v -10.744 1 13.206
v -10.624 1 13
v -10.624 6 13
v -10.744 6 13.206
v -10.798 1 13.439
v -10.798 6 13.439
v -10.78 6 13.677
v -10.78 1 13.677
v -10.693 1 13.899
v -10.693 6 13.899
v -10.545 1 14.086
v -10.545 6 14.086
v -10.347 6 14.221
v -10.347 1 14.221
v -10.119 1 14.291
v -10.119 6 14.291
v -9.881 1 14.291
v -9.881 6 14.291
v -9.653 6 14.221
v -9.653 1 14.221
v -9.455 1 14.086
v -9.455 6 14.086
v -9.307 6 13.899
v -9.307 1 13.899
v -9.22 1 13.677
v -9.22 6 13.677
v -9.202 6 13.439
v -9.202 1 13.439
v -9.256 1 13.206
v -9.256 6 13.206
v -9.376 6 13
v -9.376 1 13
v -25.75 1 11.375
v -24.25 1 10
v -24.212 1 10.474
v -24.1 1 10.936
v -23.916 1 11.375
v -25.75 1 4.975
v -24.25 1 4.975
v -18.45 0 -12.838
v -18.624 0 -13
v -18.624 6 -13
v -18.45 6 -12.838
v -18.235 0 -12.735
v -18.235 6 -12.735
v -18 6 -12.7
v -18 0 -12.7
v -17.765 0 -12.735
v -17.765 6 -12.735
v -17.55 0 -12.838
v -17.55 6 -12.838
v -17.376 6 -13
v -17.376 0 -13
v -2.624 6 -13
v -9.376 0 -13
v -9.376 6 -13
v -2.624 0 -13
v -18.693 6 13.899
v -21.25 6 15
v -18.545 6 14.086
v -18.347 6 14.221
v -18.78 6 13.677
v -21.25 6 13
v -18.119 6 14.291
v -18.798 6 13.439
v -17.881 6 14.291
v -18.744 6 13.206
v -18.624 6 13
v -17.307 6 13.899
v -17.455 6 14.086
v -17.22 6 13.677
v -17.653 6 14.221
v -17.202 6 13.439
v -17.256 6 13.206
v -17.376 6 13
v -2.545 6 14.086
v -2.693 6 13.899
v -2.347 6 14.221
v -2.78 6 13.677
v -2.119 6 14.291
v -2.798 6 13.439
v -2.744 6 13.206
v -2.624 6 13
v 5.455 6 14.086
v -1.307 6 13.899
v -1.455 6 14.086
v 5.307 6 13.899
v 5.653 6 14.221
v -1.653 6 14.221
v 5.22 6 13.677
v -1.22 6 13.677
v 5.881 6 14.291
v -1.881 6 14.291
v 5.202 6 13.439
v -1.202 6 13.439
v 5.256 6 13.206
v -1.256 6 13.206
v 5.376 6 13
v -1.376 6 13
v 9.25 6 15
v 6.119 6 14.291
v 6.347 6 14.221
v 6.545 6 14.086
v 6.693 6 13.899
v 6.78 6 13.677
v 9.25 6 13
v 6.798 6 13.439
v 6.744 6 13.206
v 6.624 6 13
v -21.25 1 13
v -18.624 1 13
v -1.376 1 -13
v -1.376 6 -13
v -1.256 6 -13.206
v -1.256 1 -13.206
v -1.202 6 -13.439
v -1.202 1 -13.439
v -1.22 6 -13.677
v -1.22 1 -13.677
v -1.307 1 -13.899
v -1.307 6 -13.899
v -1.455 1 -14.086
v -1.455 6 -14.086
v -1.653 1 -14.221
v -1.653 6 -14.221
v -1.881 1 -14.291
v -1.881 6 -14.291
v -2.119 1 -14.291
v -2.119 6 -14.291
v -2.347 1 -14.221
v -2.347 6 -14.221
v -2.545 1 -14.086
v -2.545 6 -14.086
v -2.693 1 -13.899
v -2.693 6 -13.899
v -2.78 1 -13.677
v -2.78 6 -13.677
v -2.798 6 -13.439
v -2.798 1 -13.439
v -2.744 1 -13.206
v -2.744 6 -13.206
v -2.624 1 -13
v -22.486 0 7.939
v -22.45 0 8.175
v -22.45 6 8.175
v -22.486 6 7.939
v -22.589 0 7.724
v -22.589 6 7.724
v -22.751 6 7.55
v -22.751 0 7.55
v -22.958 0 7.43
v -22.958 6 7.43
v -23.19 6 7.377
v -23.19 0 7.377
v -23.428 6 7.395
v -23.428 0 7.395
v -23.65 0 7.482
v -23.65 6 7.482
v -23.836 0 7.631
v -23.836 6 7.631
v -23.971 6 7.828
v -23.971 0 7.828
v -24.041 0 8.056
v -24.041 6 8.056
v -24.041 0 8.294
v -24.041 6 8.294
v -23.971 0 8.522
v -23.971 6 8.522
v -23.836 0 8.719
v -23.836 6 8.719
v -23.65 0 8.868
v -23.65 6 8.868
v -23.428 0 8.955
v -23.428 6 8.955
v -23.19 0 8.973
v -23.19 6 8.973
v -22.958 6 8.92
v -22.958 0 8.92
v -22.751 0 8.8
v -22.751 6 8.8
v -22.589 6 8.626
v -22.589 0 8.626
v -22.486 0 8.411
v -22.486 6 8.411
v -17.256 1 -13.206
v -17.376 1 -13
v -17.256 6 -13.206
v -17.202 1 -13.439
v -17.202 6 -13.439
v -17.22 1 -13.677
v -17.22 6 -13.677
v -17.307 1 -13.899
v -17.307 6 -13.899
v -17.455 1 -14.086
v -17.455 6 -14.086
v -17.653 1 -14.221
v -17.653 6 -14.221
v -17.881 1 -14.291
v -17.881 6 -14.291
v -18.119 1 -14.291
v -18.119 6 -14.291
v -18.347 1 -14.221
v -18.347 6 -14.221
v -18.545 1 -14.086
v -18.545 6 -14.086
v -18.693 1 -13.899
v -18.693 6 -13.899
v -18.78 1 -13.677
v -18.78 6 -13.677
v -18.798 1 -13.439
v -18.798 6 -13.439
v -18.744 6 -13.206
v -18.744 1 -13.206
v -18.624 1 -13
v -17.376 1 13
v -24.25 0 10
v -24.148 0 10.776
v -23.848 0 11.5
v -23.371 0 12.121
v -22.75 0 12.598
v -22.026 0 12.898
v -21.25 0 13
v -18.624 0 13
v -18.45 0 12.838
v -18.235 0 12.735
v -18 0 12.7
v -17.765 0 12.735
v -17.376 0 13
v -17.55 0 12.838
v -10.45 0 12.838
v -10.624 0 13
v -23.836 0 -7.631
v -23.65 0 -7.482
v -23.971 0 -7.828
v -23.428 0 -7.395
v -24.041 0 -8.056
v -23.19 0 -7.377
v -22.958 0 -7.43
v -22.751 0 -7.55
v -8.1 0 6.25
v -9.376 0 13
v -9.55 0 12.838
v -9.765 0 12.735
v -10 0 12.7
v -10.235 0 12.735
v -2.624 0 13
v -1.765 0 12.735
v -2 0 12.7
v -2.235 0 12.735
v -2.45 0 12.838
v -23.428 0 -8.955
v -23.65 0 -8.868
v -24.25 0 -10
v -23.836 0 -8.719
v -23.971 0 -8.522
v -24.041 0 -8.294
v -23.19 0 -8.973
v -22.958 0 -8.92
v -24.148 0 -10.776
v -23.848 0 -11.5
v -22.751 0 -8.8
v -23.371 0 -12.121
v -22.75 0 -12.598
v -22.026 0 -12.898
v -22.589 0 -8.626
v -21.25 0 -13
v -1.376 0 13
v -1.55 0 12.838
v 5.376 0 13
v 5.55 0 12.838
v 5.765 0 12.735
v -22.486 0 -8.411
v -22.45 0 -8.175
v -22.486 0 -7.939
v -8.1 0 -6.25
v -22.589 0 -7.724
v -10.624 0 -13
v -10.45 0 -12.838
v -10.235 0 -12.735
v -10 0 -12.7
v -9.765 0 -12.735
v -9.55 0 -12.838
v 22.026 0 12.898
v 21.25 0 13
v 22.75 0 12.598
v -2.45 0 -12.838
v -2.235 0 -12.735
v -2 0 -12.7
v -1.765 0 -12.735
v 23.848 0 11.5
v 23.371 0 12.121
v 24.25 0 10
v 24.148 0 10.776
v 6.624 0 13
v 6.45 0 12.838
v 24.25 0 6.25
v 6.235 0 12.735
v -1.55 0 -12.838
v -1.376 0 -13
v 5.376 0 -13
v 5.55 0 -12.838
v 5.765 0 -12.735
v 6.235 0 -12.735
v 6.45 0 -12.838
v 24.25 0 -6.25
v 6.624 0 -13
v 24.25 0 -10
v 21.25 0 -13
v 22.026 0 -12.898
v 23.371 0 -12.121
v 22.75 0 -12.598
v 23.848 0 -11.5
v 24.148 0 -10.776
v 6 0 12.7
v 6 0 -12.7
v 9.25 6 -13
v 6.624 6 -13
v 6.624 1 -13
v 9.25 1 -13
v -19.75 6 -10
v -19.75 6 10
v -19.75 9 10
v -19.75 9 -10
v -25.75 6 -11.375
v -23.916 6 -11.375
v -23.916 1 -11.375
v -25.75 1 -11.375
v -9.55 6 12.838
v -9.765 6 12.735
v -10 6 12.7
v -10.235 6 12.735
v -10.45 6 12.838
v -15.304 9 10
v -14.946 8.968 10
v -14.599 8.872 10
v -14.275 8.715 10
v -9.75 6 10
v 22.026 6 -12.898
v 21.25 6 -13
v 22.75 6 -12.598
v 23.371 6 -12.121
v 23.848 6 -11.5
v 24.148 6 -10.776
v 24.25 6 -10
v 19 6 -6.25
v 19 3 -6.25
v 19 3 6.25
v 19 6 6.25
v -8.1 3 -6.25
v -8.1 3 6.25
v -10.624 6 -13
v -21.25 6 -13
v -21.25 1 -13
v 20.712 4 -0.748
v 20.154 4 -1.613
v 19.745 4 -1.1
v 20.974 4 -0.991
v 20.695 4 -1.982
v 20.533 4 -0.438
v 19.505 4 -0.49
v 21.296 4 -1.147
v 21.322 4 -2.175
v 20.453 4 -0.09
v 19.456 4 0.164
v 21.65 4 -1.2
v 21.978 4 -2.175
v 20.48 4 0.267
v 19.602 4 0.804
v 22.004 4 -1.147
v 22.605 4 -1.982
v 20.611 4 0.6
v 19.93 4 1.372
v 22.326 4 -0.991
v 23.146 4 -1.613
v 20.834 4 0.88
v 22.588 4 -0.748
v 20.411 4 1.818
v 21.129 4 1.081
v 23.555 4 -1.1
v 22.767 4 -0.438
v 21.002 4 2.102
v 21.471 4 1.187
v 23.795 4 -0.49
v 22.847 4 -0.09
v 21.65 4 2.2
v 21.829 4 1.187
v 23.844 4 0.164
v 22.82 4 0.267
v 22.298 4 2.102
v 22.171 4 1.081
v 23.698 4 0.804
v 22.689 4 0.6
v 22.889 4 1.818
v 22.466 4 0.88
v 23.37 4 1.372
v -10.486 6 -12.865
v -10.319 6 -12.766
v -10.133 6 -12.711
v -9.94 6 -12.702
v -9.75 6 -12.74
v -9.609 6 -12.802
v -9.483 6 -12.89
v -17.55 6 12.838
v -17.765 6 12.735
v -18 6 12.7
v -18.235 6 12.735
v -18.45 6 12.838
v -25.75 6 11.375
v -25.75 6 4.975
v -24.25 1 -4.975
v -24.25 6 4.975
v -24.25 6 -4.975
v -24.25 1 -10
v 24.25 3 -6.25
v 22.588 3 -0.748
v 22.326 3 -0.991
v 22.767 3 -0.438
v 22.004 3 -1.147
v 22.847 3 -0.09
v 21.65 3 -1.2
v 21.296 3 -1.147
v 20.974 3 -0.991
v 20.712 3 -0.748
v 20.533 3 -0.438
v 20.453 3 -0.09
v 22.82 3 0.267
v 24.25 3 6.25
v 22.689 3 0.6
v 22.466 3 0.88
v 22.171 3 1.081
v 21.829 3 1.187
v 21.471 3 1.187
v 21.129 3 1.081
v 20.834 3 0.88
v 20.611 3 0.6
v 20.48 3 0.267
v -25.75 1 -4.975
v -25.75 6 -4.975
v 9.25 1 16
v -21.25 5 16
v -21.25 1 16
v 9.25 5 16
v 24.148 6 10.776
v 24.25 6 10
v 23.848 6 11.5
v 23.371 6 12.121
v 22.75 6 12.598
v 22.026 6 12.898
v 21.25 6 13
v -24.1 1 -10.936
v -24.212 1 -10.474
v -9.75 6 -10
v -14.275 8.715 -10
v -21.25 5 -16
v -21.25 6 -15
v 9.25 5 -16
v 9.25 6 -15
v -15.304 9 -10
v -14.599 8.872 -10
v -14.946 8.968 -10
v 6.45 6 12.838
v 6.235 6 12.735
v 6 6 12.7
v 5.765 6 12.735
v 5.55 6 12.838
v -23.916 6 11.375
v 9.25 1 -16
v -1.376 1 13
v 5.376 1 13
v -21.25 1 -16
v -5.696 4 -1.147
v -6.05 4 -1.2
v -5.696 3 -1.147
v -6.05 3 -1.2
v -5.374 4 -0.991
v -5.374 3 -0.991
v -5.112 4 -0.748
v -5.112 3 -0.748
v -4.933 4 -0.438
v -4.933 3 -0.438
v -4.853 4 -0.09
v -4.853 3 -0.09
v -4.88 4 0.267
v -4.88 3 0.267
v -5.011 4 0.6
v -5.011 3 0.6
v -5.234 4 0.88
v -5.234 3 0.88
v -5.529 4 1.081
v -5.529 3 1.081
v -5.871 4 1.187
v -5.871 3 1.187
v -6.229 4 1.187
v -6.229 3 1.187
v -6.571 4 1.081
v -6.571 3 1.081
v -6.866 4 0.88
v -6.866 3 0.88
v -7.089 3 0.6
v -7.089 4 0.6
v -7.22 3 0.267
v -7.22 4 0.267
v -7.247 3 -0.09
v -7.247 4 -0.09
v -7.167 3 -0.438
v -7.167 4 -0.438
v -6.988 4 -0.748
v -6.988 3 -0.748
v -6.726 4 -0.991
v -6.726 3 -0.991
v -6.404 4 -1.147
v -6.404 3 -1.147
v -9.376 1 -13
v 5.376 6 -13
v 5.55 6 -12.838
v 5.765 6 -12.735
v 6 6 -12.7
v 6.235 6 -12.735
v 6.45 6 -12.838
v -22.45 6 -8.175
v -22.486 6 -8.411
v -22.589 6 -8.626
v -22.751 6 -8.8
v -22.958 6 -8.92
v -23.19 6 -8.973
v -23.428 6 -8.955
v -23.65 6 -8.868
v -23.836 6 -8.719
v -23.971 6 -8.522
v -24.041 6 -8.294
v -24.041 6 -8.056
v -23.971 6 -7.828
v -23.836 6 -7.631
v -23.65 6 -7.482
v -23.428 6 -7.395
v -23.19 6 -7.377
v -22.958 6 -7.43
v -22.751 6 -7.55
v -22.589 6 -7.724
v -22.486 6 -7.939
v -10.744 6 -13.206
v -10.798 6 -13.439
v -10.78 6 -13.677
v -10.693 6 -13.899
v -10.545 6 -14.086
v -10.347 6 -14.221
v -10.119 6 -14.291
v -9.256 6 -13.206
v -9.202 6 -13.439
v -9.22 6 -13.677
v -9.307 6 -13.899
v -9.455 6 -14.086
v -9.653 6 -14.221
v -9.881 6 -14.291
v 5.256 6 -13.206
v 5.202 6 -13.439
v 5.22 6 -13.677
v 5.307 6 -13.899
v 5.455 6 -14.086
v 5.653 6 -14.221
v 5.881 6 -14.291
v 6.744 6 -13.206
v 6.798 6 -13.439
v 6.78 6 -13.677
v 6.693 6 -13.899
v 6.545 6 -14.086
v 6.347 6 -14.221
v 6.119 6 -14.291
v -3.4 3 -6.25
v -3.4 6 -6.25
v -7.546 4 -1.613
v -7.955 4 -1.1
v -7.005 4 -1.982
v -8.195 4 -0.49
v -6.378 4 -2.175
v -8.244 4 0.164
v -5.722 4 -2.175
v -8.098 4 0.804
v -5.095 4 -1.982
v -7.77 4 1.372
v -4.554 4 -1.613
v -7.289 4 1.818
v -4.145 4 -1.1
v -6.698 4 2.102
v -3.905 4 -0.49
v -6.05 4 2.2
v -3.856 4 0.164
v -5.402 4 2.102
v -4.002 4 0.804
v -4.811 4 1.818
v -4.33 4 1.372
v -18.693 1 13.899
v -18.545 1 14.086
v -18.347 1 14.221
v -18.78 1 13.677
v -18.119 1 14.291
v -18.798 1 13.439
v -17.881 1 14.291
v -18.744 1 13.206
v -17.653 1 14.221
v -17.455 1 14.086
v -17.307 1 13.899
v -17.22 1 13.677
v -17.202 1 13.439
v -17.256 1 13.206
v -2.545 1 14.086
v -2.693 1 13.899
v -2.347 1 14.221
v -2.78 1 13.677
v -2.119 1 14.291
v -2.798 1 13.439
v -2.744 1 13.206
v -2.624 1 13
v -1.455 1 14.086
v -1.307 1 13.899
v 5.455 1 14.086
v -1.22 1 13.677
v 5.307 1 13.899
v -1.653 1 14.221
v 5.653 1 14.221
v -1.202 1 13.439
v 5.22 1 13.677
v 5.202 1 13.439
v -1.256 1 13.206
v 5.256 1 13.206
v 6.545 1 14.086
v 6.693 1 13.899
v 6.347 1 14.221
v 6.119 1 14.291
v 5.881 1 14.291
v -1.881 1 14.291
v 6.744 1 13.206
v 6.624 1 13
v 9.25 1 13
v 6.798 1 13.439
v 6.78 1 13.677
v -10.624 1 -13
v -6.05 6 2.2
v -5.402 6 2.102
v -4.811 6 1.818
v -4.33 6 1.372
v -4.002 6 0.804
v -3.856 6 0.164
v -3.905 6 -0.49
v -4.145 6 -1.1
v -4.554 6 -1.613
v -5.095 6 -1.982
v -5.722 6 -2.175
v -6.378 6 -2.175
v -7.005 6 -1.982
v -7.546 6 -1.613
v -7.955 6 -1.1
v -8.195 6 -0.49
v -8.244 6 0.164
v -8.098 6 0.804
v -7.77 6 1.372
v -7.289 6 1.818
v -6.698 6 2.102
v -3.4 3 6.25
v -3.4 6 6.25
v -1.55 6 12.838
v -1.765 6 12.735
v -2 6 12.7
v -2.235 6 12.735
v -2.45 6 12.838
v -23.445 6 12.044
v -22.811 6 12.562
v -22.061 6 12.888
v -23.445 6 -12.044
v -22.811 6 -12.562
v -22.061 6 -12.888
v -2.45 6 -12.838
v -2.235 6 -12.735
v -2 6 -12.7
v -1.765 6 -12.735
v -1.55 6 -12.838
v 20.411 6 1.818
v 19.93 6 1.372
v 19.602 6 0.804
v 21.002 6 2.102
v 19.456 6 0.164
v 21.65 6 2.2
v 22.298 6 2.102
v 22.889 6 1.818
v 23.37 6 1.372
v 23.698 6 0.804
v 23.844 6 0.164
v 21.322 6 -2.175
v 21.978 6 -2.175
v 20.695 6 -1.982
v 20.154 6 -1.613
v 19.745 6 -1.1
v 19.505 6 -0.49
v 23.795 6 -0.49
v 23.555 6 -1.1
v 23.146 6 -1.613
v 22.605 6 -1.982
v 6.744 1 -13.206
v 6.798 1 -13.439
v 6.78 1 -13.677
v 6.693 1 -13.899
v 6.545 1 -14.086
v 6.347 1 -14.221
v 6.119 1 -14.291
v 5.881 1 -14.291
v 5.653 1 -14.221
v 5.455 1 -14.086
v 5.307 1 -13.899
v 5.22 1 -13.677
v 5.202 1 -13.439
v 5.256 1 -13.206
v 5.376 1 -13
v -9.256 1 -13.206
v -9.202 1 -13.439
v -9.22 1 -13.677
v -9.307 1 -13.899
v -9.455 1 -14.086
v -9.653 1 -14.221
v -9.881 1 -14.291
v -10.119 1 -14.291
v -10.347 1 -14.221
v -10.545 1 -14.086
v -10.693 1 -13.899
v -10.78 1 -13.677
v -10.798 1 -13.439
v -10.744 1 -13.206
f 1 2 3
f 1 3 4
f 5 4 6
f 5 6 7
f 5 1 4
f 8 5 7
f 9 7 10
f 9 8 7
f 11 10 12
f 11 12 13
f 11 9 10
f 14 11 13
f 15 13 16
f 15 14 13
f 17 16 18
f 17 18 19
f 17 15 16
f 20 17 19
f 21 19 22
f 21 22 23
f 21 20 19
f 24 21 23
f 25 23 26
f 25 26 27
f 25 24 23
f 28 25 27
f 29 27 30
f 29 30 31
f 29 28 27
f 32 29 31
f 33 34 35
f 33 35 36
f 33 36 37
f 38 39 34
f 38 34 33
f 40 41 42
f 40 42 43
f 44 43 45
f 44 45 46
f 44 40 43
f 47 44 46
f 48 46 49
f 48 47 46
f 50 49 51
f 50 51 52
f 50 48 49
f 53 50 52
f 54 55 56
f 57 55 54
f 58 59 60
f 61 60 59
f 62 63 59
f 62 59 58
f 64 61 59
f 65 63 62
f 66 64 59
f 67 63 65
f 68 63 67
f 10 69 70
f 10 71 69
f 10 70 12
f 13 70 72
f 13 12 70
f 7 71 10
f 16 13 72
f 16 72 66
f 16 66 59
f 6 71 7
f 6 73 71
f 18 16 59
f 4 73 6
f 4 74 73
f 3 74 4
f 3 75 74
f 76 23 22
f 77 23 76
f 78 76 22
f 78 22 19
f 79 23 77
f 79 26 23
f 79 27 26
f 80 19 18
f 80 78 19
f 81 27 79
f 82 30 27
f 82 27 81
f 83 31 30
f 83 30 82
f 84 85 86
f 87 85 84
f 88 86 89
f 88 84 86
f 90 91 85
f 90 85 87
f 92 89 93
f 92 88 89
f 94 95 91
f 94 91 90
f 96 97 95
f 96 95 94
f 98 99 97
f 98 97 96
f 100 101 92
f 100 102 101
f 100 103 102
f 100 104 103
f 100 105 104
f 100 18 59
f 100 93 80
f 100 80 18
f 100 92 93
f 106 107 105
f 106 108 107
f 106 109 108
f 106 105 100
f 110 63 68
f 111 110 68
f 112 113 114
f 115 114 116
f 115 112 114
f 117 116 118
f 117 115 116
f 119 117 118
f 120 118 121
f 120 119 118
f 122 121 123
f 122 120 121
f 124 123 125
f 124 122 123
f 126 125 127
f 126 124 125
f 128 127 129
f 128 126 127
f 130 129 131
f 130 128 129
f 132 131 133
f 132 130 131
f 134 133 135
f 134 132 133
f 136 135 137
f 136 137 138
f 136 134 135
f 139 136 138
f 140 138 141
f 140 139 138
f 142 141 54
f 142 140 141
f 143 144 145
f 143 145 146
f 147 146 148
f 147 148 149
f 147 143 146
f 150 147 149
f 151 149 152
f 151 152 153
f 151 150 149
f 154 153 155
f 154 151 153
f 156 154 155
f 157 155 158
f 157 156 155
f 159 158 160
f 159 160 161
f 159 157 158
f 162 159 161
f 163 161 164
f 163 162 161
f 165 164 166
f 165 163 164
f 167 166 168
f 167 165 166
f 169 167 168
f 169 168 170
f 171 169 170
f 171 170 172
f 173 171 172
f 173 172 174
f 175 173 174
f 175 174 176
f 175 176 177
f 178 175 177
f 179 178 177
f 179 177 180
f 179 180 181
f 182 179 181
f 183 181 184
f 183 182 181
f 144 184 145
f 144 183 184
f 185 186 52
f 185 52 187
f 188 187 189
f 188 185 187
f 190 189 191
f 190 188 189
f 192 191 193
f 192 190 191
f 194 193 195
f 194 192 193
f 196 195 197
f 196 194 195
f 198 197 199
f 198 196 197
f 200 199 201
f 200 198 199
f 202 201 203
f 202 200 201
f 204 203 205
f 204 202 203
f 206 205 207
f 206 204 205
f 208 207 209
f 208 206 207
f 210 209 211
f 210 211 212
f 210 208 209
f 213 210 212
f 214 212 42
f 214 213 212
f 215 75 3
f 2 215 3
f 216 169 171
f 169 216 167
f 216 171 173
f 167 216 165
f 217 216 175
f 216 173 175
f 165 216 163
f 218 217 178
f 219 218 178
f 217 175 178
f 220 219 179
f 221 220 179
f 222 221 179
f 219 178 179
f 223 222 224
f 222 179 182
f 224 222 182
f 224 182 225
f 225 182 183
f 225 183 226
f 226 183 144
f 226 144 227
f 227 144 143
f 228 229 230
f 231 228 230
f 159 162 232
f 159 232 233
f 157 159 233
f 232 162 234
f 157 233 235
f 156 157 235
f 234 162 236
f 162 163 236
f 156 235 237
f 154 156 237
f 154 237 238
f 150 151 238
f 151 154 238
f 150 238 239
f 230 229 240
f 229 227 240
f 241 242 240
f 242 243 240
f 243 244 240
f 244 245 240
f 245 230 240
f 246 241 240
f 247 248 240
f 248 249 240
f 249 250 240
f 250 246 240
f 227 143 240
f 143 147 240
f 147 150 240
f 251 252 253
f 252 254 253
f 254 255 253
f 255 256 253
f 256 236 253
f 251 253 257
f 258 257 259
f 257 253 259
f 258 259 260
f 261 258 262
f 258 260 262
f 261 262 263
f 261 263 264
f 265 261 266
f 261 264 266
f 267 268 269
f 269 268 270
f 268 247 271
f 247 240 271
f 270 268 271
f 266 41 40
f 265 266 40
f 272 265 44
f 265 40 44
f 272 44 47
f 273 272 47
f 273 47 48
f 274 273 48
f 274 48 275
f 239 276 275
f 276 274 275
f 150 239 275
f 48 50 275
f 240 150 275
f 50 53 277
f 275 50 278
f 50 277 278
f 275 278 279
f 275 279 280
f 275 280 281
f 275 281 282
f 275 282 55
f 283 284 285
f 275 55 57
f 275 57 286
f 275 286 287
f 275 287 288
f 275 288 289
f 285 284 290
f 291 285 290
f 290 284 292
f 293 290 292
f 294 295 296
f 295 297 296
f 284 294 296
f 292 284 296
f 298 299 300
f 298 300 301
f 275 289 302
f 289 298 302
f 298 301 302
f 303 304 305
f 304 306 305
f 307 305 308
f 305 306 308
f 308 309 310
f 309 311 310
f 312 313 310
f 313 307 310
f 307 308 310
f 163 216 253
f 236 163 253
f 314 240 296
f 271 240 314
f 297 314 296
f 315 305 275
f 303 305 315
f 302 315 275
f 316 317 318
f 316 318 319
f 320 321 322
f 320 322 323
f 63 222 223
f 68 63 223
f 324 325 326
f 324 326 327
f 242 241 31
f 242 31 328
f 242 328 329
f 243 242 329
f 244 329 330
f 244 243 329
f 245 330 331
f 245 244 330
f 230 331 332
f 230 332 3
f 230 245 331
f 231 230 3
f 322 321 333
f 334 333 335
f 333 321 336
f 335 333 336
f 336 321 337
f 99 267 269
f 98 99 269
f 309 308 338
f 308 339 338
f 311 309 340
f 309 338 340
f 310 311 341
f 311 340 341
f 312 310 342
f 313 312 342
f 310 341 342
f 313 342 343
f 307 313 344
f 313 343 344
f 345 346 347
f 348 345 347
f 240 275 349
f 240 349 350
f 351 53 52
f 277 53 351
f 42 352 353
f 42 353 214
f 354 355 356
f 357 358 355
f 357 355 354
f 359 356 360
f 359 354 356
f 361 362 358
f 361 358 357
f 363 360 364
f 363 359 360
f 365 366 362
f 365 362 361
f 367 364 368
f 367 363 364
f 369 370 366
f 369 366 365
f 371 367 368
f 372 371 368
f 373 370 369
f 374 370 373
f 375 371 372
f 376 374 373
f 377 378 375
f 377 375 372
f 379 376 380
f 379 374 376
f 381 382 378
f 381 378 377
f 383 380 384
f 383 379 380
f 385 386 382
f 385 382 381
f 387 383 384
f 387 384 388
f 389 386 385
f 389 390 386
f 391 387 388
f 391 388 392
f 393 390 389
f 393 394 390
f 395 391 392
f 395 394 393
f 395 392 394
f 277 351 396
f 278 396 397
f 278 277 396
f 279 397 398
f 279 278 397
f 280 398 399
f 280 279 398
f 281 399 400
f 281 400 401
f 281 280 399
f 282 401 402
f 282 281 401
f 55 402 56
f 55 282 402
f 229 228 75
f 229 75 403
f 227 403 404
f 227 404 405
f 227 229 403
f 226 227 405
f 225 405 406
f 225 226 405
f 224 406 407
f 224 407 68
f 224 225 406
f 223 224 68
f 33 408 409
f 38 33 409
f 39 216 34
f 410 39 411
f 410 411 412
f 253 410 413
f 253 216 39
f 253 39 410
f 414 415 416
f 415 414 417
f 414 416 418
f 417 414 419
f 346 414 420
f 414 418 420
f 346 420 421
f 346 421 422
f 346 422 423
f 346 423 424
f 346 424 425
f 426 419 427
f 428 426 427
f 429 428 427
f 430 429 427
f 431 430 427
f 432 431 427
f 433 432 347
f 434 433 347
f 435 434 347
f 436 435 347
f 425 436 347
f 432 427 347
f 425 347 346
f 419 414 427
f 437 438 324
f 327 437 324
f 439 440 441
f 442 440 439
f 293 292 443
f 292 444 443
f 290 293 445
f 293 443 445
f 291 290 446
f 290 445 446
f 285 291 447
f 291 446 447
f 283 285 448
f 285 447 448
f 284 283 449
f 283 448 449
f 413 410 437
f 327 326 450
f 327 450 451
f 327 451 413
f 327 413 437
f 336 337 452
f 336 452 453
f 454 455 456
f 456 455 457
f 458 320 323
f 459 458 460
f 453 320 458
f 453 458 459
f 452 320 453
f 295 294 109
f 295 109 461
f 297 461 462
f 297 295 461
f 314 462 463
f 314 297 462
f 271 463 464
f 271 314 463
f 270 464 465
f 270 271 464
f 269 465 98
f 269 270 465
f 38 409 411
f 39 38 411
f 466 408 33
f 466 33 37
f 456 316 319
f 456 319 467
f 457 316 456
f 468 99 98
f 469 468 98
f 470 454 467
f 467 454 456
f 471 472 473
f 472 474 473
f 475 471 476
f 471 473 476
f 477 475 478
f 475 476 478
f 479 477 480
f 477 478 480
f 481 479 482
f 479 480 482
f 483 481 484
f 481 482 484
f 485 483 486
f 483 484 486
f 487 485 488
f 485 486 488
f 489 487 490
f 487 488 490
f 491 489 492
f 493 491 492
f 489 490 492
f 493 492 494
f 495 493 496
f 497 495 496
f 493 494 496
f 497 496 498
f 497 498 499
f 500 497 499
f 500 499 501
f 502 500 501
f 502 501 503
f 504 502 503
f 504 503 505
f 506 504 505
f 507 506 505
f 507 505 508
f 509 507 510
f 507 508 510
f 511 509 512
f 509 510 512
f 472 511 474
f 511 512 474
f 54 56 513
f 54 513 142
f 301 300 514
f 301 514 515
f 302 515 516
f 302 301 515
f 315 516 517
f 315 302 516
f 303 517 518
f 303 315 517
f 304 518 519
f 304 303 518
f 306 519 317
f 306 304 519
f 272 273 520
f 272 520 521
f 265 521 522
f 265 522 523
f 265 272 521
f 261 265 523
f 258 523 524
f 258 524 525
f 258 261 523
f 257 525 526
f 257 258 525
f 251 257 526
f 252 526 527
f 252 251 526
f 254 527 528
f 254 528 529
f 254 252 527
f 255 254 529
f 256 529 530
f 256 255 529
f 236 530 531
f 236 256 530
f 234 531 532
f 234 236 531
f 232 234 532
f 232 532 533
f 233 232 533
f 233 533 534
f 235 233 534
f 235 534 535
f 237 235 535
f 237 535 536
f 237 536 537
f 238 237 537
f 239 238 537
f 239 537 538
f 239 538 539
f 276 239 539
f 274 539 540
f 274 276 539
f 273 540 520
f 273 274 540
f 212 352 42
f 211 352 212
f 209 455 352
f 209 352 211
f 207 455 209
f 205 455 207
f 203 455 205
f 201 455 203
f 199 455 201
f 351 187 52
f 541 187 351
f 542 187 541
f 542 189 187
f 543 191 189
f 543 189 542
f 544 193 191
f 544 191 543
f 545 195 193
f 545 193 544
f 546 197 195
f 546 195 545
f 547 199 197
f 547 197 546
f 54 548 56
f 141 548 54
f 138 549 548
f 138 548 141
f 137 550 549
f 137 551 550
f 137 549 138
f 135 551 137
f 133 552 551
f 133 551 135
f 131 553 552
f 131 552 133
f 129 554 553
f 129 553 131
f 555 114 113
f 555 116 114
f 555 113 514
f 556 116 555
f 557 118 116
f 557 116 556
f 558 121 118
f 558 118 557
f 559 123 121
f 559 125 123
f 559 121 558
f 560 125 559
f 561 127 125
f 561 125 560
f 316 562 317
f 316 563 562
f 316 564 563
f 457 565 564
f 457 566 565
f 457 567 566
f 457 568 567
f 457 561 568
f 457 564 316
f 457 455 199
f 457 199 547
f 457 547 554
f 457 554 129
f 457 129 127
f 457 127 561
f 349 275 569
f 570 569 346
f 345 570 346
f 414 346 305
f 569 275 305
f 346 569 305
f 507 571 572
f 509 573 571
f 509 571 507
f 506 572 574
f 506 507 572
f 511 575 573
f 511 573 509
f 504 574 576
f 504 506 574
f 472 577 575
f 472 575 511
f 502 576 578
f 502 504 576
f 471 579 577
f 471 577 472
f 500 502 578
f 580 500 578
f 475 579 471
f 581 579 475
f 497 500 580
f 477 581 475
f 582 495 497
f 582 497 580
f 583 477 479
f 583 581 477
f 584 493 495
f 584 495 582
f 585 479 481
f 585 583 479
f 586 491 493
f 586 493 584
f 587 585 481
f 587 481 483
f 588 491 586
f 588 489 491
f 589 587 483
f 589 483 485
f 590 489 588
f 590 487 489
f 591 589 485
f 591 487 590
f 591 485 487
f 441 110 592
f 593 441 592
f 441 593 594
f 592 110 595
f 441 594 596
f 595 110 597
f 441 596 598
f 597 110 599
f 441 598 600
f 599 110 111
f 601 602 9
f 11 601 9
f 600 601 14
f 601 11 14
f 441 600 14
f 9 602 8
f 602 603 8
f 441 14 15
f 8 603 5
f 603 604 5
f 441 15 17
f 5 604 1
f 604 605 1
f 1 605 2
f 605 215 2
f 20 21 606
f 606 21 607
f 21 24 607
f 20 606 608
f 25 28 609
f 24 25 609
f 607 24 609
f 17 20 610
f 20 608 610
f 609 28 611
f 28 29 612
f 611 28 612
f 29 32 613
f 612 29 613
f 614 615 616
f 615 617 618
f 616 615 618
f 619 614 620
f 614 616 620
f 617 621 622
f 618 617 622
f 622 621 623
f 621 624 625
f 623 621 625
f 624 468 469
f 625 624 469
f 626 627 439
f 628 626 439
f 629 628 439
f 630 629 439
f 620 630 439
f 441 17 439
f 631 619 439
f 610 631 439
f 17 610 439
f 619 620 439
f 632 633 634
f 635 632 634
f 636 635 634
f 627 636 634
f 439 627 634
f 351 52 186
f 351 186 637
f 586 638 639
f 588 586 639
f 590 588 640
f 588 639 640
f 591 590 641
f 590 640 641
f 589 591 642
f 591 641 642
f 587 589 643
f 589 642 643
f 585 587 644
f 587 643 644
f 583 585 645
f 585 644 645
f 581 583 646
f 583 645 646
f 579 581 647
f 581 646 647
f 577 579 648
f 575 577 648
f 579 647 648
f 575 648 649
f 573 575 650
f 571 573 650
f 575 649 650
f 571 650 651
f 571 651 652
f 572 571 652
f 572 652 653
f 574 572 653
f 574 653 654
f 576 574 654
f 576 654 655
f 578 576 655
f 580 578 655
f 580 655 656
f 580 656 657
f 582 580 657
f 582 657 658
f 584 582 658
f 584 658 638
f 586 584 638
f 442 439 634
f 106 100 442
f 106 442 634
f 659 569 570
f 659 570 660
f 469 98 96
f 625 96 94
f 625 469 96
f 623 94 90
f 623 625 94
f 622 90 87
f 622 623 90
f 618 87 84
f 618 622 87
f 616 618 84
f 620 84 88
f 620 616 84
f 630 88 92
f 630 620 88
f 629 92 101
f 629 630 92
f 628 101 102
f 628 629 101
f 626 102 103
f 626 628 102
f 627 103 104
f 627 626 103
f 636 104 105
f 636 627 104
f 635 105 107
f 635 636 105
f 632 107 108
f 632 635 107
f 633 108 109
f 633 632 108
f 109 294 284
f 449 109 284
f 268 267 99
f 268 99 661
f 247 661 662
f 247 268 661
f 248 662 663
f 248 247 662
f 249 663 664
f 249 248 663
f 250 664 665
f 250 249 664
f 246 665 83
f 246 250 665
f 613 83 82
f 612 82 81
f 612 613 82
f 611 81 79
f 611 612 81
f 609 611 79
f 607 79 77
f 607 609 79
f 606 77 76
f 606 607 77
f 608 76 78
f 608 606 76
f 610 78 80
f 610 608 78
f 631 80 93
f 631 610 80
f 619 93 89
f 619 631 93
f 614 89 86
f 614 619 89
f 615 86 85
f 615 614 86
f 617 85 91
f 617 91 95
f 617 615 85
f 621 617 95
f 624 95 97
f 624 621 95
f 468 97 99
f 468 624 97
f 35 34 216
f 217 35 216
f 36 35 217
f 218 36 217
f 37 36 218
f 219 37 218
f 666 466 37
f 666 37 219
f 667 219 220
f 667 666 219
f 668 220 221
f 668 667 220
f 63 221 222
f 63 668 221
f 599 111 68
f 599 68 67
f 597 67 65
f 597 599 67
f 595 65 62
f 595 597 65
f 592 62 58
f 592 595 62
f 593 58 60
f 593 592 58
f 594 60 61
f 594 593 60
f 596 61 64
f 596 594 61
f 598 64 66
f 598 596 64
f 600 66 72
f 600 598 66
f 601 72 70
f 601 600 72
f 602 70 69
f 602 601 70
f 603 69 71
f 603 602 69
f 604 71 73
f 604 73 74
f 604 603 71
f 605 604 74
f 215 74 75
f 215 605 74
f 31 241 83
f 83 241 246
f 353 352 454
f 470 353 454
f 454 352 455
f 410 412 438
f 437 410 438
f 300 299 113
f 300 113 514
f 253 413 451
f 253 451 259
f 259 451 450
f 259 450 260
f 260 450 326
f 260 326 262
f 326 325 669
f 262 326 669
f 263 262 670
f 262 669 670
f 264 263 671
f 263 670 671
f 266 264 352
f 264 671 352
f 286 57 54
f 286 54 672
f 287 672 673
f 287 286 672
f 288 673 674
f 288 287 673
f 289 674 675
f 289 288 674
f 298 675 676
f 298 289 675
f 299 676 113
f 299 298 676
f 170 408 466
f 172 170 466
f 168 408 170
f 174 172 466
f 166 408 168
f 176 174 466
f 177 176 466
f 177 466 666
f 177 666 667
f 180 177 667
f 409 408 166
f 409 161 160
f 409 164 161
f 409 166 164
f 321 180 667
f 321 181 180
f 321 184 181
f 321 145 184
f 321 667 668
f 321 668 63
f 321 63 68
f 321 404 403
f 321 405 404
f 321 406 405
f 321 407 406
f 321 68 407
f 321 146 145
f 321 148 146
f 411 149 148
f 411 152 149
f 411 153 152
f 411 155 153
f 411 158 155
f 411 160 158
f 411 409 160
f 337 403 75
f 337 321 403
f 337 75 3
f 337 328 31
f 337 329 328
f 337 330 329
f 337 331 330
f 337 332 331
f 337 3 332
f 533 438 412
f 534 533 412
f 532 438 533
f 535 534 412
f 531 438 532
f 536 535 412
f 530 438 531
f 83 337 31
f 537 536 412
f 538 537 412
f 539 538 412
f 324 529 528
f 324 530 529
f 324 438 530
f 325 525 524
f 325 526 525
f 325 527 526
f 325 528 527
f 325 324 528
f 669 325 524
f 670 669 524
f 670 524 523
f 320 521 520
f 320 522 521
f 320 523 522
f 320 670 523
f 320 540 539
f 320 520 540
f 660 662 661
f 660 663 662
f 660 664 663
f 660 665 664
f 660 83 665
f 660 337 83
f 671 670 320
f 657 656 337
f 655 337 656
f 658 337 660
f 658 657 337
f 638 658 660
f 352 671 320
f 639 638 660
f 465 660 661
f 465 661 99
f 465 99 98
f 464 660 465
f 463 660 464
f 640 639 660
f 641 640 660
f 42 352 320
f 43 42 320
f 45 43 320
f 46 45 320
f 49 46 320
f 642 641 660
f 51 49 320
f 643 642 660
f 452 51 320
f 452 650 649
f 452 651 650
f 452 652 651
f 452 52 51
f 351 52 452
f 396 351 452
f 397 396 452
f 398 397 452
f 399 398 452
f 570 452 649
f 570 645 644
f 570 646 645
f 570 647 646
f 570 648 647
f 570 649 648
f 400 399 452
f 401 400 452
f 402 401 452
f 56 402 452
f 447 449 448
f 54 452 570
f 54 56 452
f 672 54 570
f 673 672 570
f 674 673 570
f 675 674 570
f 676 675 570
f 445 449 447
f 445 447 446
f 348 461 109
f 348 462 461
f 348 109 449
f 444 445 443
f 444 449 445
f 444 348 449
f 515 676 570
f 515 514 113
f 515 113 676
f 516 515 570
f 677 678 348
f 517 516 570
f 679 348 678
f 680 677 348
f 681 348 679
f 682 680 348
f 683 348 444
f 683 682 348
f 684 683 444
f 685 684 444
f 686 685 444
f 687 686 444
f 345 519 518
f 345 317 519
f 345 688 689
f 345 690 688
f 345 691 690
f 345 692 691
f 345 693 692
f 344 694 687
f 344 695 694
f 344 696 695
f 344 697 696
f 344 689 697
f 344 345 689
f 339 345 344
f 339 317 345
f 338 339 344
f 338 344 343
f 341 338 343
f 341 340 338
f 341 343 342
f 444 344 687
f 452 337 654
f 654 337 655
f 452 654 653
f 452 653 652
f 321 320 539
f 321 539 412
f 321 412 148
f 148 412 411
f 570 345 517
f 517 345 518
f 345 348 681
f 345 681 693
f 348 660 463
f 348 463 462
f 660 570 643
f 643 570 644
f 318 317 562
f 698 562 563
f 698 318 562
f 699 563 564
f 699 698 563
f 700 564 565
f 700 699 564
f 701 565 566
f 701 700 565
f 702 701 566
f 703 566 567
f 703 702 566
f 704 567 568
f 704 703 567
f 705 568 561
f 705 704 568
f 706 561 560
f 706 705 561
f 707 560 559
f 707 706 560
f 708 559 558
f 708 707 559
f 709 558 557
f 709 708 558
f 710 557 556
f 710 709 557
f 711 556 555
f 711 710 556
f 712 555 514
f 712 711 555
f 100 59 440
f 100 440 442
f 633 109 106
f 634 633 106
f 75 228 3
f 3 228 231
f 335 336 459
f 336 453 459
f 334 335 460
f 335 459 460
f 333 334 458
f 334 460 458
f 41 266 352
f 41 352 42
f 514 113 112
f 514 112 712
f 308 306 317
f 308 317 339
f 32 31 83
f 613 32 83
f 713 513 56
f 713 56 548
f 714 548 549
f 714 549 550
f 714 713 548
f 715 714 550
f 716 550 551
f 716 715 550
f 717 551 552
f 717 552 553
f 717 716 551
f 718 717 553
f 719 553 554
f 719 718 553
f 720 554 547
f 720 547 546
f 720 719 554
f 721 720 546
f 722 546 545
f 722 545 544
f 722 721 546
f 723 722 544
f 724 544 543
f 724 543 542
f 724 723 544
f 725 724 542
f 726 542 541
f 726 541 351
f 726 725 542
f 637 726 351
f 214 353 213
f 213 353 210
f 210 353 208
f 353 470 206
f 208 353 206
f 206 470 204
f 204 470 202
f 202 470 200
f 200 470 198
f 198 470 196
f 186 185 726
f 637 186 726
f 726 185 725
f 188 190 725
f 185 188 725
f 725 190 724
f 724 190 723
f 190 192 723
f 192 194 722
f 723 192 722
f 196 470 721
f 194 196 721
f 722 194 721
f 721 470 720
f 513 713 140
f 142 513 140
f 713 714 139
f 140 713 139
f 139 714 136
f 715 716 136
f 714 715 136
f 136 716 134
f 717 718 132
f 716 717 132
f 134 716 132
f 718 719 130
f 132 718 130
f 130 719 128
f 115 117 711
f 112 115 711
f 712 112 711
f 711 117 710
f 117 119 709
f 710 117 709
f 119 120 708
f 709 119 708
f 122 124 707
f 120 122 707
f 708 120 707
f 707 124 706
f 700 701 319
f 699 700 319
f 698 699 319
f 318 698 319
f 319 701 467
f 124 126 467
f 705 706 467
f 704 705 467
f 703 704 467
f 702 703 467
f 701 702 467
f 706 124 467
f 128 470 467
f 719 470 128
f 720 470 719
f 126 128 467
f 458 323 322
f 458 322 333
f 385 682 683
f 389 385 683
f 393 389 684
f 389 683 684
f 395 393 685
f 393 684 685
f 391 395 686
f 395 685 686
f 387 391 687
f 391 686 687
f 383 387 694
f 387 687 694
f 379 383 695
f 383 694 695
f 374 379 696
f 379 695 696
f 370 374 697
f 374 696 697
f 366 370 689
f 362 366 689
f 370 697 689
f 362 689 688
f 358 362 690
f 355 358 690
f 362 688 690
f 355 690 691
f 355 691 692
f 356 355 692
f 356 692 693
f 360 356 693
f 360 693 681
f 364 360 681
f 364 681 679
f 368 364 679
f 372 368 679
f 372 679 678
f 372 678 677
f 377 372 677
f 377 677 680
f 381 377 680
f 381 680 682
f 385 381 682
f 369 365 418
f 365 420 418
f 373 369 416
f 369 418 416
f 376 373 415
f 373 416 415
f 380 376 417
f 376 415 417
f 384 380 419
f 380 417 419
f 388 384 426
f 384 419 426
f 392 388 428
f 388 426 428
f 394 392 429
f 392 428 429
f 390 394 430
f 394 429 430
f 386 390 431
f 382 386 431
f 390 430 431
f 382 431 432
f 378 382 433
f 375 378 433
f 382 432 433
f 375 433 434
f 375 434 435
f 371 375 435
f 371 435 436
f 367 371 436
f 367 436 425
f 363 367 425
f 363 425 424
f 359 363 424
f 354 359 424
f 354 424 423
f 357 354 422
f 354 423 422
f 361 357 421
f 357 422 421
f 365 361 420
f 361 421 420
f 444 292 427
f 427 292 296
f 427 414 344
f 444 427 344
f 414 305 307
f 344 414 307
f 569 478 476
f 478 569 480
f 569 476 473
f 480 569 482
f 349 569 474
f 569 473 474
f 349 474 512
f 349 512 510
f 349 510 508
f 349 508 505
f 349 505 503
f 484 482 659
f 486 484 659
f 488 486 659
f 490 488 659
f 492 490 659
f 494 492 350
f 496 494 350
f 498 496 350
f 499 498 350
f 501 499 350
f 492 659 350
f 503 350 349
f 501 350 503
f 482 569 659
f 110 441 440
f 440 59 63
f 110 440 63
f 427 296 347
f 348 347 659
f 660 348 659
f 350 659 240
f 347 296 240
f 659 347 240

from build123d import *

# Parameters (mm, degrees)
SKETCH_1_W                   = 48.5
SKETCH_1_H                   = 26
EXTRUDE_1_DEPTH              = 6
SKETCH_2_W                   = 22.4
SKETCH_2_H                   = 12.5
CUT_EXTRUDE_1_DEPTH          = 6.7
CUT_EXTRUDE_2_DEPTH          = 3
HOLE_WIZARD_M2_1_D           = 2.4
HOLE_WIZARD_M2_1_CBORE_D     = 4.4
HOLE_WIZARD_M2_1_CBORE_DEPTH = 2
SKETCH_6_W                   = 10
SKETCH_6_H                   = 20
EXTRUDE_2_DEPTH              = 3
CUT_EXTRUDE_3_DEPTH          = 35.61303945
FILLET_2_R                   = 2
FILLET_3_R                   = 3
SKETCH_8_W                   = 30.5
SKETCH_8_H                   = 3
EXTRUDE_3_DEPTH              = 5
EXTRUDE_3_2_DEPTH            = 5
M2X0_4_1_DEPTH               = 6
CHAMFER_1_SIZE               = 1
CHAMFER_3_SIZE               = 1
EXTRUDE_5_DEPTH              = 5
M2X0_4_3_OUTLINE_R           = 0.8
M2X0_4_3_DEPTH               = 6


# Read off the part's stored shape, not the designer's step: M2x0.4 螺纹孔1, M2x0.4 螺纹孔3
with BuildPart() as part:
    # 草图1 → 凸台-拉伸1 (new body)
    with BuildSketch(Plane(origin=(0, 0, 0), x_dir=(1, 0, 0), z_dir=(0, 1, 0))):
        Rectangle(SKETCH_1_W, SKETCH_1_H)
    extrude(amount=EXTRUDE_1_DEPTH)

    # 草图2 → 切除-拉伸1 (cut)
    with BuildSketch(Plane.XZ):
        with Locations((7.8, 0)):
            Rectangle(SKETCH_2_W, SKETCH_2_H)
    extrude(amount=-CUT_EXTRUDE_1_DEPTH, mode=Mode.SUBTRACT)

    # 草图3 → 切除-拉伸2 (cut)
    with BuildSketch(Plane.XZ):
        Polygon((19, -6.25), (-3.4, -6.25), (-8.1, -6.25), (-8.1, 6.25), (-3.4, 6.25), (19, 6.25), (23.7, 6.25), (24.25, 6.25), (24.25, -6.25), (23.7, -6.25), align=None)
    extrude(amount=-CUT_EXTRUDE_2_DEPTH, mode=Mode.SUBTRACT)

    # M2 凹头盖螺钉的柱形沉头孔1 (through all)
    with Locations(Plane(origin=(-6.05, 6, 0), x_dir=(0, 0, 1), z_dir=(0, 1, 0))):
        with Locations((0, 0), (0, 27.7)):
            CounterBoreHole(HOLE_WIZARD_M2_1_D / 2, HOLE_WIZARD_M2_1_CBORE_D / 2, HOLE_WIZARD_M2_1_CBORE_DEPTH)

    # 草图6 → 凸台-拉伸2 (add)
    with BuildSketch(Plane(origin=(0, 6, 0), x_dir=(1, 0, 0), z_dir=(0, 1, 0))):
        with Locations((-14.75, 0)):
            Rectangle(SKETCH_6_W, SKETCH_6_H)
    extrude(amount=EXTRUDE_2_DEPTH)

    # 草图7 → 切除-拉伸3 (cut, through all)
    with BuildSketch(Plane.XY.offset(10)):
        Polygon((-9.75, 6), (-14.75, 9), (-9.75, 9), align=None)
    extrude(amount=-CUT_EXTRUDE_3_DEPTH, mode=Mode.SUBTRACT)

    # 圆角2
    fillet_2_edges = [part.edges().sort_by_distance(p)[0] for p in [
        (-14.75, 9, 0),
    ]]
    fillet(fillet_2_edges, radius=FILLET_2_R)

    # 圆角3
    fillet_3_edges = [part.edges().sort_by_distance(p)[0] for p in [
        (24.25, 3, 13),
        (-24.25, 3, 13),
        (-24.25, 3, -13),
        (24.25, 3, -13),
    ]]
    fillet(fillet_3_edges, radius=FILLET_3_R)


with BuildPart() as body_2:
    # 草图8 → 凸台-拉伸3 (new body)
    with BuildSketch(Plane(origin=(0, 6, 0), x_dir=(1, 0, 0), z_dir=(0, 1, 0))):
        with Locations((-6, -14.5)):
            Rectangle(SKETCH_8_W, SKETCH_8_H)
    extrude(amount=-EXTRUDE_3_DEPTH)


with BuildPart() as body_3:
    # 草图8 → Extrude 3 2 (new body)
    with BuildSketch(Plane(origin=(0, 6, 0), x_dir=(1, 0, 0), z_dir=(0, 1, 0))):
        with Locations((-6, 14.5)):
            Rectangle(SKETCH_8_W, SKETCH_8_H)
    extrude(amount=-EXTRUDE_3_2_DEPTH)


with BuildPart() as m2x0_4_1_tool:
    # M2x0.4 螺纹孔1 outline → M2x0.4 螺纹孔1 (new body)
    with BuildSketch(Plane(origin=(0, 0, 0), x_dir=(1, 0, 0), z_dir=(0, 1, 0))):
        with BuildLine():
            ThreePointArc((6.6244998, 13), (6, 14.3), (5.3755002, 13))
            ThreePointArc((5.3755002, 13), (6, 12.7), (6.6244998, 13))
        make_face()
        with BuildLine():
            ThreePointArc((-18.6244998, 13), (-18, 12.7), (-17.3755002, 13))
            ThreePointArc((-17.3755002, 13), (-18, 14.3), (-18.6244998, 13))
        make_face()
        with BuildLine():
            ThreePointArc((-10.6244998, 13), (-10, 12.7), (-9.3755002, 13))
            ThreePointArc((-9.3755002, 13), (-10, 14.3), (-10.6244998, 13))
        make_face()
        with BuildLine():
            ThreePointArc((-2.6244998, 13), (-2, 12.7), (-1.3755002, 13))
            ThreePointArc((-1.3755002, 13), (-2, 14.3), (-2.6244998, 13))
        make_face()
        with BuildLine():
            ThreePointArc((-18.6244998, -13), (-18, -14.3), (-17.3755002, -13))
            ThreePointArc((-17.3755002, -13), (-18, -12.7), (-18.6244998, -13))
        make_face()
        with BuildLine():
            ThreePointArc((6.6244998, -13), (6, -12.7), (5.3755002, -13))
            ThreePointArc((5.3755002, -13), (6, -14.3), (6.6244998, -13))
        make_face()
        with BuildLine():
            ThreePointArc((-1.3755002, -13), (-2, -12.7), (-2.6244998, -13))
            ThreePointArc((-2.6244998, -13), (-2, -14.3), (-1.3755002, -13))
        make_face()
        with BuildLine():
            ThreePointArc((-9.3755002, -13), (-10, -12.7), (-10.6244998, -13))
            ThreePointArc((-10.6244998, -13), (-10, -14.3), (-9.3755002, -13))
        make_face()
    extrude(amount=M2X0_4_1_DEPTH)


with BuildPart() as part_1:
    add(part.part)

    # M2x0.4 螺纹孔1: cut by m2x0_4_1_tool
    add(m2x0_4_1_tool.part, mode=Mode.SUBTRACT)

    # 草图17 → 凸台-拉伸5 (add)
    with BuildSketch(Plane(origin=(0, 6, 0), x_dir=(1, 0, 0), z_dir=(0, 1, 0))):
        Polygon((-23.977178029, 11.375), (-23.894080215, 11.375), (-24.25, 10), (-24.25, 4.975), (-25.75, 4.975), (-25.75, 11.375), align=None)
        Polygon((-25.75, -4.975), (-24.25, -4.975), (-24.25, -10), (-23.853349066, -11.375), (-23.977178029, -11.375), (-25.75, -11.375), align=None)
    extrude(amount=-EXTRUDE_5_DEPTH)

    # M2x0.4 螺纹孔3 outline → M2x0.4 螺纹孔3 (cut)
    with BuildSketch(Plane(origin=(0, 0, 0), x_dir=(1, 0, 0), z_dir=(0, 1, 0))):
        with Locations((-23.25, -8.175)):
            Circle(M2X0_4_3_OUTLINE_R)
        with Locations((-23.25, 8.175)):
            Circle(M2X0_4_3_OUTLINE_R)
    extrude(amount=M2X0_4_3_DEPTH, mode=Mode.SUBTRACT)


with BuildPart() as body_2_1:
    add(body_2.part)

    # M2x0.4 螺纹孔1: cut by m2x0_4_1_tool
    add(m2x0_4_1_tool.part, mode=Mode.SUBTRACT)

    # 倒角1
    chamfer_1_edges = [body_2_1.edges().sort_by_distance(p)[0] for p in [
        (-6, 6, 16),
    ]]
    chamfer(chamfer_1_edges, length=CHAMFER_1_SIZE)


with BuildPart() as body_3_1:
    add(body_3.part)

    # M2x0.4 螺纹孔1: cut by m2x0_4_1_tool
    add(m2x0_4_1_tool.part, mode=Mode.SUBTRACT)

    # 倒角3
    chamfer_3_edges = [body_3_1.edges().sort_by_distance(p)[0] for p in [
        (-6, 6, -16),
    ]]
    chamfer(chamfer_3_edges, length=CHAMFER_3_SIZE)


solid = Compound([part_1.part, body_2_1.part, body_3_1.part])
